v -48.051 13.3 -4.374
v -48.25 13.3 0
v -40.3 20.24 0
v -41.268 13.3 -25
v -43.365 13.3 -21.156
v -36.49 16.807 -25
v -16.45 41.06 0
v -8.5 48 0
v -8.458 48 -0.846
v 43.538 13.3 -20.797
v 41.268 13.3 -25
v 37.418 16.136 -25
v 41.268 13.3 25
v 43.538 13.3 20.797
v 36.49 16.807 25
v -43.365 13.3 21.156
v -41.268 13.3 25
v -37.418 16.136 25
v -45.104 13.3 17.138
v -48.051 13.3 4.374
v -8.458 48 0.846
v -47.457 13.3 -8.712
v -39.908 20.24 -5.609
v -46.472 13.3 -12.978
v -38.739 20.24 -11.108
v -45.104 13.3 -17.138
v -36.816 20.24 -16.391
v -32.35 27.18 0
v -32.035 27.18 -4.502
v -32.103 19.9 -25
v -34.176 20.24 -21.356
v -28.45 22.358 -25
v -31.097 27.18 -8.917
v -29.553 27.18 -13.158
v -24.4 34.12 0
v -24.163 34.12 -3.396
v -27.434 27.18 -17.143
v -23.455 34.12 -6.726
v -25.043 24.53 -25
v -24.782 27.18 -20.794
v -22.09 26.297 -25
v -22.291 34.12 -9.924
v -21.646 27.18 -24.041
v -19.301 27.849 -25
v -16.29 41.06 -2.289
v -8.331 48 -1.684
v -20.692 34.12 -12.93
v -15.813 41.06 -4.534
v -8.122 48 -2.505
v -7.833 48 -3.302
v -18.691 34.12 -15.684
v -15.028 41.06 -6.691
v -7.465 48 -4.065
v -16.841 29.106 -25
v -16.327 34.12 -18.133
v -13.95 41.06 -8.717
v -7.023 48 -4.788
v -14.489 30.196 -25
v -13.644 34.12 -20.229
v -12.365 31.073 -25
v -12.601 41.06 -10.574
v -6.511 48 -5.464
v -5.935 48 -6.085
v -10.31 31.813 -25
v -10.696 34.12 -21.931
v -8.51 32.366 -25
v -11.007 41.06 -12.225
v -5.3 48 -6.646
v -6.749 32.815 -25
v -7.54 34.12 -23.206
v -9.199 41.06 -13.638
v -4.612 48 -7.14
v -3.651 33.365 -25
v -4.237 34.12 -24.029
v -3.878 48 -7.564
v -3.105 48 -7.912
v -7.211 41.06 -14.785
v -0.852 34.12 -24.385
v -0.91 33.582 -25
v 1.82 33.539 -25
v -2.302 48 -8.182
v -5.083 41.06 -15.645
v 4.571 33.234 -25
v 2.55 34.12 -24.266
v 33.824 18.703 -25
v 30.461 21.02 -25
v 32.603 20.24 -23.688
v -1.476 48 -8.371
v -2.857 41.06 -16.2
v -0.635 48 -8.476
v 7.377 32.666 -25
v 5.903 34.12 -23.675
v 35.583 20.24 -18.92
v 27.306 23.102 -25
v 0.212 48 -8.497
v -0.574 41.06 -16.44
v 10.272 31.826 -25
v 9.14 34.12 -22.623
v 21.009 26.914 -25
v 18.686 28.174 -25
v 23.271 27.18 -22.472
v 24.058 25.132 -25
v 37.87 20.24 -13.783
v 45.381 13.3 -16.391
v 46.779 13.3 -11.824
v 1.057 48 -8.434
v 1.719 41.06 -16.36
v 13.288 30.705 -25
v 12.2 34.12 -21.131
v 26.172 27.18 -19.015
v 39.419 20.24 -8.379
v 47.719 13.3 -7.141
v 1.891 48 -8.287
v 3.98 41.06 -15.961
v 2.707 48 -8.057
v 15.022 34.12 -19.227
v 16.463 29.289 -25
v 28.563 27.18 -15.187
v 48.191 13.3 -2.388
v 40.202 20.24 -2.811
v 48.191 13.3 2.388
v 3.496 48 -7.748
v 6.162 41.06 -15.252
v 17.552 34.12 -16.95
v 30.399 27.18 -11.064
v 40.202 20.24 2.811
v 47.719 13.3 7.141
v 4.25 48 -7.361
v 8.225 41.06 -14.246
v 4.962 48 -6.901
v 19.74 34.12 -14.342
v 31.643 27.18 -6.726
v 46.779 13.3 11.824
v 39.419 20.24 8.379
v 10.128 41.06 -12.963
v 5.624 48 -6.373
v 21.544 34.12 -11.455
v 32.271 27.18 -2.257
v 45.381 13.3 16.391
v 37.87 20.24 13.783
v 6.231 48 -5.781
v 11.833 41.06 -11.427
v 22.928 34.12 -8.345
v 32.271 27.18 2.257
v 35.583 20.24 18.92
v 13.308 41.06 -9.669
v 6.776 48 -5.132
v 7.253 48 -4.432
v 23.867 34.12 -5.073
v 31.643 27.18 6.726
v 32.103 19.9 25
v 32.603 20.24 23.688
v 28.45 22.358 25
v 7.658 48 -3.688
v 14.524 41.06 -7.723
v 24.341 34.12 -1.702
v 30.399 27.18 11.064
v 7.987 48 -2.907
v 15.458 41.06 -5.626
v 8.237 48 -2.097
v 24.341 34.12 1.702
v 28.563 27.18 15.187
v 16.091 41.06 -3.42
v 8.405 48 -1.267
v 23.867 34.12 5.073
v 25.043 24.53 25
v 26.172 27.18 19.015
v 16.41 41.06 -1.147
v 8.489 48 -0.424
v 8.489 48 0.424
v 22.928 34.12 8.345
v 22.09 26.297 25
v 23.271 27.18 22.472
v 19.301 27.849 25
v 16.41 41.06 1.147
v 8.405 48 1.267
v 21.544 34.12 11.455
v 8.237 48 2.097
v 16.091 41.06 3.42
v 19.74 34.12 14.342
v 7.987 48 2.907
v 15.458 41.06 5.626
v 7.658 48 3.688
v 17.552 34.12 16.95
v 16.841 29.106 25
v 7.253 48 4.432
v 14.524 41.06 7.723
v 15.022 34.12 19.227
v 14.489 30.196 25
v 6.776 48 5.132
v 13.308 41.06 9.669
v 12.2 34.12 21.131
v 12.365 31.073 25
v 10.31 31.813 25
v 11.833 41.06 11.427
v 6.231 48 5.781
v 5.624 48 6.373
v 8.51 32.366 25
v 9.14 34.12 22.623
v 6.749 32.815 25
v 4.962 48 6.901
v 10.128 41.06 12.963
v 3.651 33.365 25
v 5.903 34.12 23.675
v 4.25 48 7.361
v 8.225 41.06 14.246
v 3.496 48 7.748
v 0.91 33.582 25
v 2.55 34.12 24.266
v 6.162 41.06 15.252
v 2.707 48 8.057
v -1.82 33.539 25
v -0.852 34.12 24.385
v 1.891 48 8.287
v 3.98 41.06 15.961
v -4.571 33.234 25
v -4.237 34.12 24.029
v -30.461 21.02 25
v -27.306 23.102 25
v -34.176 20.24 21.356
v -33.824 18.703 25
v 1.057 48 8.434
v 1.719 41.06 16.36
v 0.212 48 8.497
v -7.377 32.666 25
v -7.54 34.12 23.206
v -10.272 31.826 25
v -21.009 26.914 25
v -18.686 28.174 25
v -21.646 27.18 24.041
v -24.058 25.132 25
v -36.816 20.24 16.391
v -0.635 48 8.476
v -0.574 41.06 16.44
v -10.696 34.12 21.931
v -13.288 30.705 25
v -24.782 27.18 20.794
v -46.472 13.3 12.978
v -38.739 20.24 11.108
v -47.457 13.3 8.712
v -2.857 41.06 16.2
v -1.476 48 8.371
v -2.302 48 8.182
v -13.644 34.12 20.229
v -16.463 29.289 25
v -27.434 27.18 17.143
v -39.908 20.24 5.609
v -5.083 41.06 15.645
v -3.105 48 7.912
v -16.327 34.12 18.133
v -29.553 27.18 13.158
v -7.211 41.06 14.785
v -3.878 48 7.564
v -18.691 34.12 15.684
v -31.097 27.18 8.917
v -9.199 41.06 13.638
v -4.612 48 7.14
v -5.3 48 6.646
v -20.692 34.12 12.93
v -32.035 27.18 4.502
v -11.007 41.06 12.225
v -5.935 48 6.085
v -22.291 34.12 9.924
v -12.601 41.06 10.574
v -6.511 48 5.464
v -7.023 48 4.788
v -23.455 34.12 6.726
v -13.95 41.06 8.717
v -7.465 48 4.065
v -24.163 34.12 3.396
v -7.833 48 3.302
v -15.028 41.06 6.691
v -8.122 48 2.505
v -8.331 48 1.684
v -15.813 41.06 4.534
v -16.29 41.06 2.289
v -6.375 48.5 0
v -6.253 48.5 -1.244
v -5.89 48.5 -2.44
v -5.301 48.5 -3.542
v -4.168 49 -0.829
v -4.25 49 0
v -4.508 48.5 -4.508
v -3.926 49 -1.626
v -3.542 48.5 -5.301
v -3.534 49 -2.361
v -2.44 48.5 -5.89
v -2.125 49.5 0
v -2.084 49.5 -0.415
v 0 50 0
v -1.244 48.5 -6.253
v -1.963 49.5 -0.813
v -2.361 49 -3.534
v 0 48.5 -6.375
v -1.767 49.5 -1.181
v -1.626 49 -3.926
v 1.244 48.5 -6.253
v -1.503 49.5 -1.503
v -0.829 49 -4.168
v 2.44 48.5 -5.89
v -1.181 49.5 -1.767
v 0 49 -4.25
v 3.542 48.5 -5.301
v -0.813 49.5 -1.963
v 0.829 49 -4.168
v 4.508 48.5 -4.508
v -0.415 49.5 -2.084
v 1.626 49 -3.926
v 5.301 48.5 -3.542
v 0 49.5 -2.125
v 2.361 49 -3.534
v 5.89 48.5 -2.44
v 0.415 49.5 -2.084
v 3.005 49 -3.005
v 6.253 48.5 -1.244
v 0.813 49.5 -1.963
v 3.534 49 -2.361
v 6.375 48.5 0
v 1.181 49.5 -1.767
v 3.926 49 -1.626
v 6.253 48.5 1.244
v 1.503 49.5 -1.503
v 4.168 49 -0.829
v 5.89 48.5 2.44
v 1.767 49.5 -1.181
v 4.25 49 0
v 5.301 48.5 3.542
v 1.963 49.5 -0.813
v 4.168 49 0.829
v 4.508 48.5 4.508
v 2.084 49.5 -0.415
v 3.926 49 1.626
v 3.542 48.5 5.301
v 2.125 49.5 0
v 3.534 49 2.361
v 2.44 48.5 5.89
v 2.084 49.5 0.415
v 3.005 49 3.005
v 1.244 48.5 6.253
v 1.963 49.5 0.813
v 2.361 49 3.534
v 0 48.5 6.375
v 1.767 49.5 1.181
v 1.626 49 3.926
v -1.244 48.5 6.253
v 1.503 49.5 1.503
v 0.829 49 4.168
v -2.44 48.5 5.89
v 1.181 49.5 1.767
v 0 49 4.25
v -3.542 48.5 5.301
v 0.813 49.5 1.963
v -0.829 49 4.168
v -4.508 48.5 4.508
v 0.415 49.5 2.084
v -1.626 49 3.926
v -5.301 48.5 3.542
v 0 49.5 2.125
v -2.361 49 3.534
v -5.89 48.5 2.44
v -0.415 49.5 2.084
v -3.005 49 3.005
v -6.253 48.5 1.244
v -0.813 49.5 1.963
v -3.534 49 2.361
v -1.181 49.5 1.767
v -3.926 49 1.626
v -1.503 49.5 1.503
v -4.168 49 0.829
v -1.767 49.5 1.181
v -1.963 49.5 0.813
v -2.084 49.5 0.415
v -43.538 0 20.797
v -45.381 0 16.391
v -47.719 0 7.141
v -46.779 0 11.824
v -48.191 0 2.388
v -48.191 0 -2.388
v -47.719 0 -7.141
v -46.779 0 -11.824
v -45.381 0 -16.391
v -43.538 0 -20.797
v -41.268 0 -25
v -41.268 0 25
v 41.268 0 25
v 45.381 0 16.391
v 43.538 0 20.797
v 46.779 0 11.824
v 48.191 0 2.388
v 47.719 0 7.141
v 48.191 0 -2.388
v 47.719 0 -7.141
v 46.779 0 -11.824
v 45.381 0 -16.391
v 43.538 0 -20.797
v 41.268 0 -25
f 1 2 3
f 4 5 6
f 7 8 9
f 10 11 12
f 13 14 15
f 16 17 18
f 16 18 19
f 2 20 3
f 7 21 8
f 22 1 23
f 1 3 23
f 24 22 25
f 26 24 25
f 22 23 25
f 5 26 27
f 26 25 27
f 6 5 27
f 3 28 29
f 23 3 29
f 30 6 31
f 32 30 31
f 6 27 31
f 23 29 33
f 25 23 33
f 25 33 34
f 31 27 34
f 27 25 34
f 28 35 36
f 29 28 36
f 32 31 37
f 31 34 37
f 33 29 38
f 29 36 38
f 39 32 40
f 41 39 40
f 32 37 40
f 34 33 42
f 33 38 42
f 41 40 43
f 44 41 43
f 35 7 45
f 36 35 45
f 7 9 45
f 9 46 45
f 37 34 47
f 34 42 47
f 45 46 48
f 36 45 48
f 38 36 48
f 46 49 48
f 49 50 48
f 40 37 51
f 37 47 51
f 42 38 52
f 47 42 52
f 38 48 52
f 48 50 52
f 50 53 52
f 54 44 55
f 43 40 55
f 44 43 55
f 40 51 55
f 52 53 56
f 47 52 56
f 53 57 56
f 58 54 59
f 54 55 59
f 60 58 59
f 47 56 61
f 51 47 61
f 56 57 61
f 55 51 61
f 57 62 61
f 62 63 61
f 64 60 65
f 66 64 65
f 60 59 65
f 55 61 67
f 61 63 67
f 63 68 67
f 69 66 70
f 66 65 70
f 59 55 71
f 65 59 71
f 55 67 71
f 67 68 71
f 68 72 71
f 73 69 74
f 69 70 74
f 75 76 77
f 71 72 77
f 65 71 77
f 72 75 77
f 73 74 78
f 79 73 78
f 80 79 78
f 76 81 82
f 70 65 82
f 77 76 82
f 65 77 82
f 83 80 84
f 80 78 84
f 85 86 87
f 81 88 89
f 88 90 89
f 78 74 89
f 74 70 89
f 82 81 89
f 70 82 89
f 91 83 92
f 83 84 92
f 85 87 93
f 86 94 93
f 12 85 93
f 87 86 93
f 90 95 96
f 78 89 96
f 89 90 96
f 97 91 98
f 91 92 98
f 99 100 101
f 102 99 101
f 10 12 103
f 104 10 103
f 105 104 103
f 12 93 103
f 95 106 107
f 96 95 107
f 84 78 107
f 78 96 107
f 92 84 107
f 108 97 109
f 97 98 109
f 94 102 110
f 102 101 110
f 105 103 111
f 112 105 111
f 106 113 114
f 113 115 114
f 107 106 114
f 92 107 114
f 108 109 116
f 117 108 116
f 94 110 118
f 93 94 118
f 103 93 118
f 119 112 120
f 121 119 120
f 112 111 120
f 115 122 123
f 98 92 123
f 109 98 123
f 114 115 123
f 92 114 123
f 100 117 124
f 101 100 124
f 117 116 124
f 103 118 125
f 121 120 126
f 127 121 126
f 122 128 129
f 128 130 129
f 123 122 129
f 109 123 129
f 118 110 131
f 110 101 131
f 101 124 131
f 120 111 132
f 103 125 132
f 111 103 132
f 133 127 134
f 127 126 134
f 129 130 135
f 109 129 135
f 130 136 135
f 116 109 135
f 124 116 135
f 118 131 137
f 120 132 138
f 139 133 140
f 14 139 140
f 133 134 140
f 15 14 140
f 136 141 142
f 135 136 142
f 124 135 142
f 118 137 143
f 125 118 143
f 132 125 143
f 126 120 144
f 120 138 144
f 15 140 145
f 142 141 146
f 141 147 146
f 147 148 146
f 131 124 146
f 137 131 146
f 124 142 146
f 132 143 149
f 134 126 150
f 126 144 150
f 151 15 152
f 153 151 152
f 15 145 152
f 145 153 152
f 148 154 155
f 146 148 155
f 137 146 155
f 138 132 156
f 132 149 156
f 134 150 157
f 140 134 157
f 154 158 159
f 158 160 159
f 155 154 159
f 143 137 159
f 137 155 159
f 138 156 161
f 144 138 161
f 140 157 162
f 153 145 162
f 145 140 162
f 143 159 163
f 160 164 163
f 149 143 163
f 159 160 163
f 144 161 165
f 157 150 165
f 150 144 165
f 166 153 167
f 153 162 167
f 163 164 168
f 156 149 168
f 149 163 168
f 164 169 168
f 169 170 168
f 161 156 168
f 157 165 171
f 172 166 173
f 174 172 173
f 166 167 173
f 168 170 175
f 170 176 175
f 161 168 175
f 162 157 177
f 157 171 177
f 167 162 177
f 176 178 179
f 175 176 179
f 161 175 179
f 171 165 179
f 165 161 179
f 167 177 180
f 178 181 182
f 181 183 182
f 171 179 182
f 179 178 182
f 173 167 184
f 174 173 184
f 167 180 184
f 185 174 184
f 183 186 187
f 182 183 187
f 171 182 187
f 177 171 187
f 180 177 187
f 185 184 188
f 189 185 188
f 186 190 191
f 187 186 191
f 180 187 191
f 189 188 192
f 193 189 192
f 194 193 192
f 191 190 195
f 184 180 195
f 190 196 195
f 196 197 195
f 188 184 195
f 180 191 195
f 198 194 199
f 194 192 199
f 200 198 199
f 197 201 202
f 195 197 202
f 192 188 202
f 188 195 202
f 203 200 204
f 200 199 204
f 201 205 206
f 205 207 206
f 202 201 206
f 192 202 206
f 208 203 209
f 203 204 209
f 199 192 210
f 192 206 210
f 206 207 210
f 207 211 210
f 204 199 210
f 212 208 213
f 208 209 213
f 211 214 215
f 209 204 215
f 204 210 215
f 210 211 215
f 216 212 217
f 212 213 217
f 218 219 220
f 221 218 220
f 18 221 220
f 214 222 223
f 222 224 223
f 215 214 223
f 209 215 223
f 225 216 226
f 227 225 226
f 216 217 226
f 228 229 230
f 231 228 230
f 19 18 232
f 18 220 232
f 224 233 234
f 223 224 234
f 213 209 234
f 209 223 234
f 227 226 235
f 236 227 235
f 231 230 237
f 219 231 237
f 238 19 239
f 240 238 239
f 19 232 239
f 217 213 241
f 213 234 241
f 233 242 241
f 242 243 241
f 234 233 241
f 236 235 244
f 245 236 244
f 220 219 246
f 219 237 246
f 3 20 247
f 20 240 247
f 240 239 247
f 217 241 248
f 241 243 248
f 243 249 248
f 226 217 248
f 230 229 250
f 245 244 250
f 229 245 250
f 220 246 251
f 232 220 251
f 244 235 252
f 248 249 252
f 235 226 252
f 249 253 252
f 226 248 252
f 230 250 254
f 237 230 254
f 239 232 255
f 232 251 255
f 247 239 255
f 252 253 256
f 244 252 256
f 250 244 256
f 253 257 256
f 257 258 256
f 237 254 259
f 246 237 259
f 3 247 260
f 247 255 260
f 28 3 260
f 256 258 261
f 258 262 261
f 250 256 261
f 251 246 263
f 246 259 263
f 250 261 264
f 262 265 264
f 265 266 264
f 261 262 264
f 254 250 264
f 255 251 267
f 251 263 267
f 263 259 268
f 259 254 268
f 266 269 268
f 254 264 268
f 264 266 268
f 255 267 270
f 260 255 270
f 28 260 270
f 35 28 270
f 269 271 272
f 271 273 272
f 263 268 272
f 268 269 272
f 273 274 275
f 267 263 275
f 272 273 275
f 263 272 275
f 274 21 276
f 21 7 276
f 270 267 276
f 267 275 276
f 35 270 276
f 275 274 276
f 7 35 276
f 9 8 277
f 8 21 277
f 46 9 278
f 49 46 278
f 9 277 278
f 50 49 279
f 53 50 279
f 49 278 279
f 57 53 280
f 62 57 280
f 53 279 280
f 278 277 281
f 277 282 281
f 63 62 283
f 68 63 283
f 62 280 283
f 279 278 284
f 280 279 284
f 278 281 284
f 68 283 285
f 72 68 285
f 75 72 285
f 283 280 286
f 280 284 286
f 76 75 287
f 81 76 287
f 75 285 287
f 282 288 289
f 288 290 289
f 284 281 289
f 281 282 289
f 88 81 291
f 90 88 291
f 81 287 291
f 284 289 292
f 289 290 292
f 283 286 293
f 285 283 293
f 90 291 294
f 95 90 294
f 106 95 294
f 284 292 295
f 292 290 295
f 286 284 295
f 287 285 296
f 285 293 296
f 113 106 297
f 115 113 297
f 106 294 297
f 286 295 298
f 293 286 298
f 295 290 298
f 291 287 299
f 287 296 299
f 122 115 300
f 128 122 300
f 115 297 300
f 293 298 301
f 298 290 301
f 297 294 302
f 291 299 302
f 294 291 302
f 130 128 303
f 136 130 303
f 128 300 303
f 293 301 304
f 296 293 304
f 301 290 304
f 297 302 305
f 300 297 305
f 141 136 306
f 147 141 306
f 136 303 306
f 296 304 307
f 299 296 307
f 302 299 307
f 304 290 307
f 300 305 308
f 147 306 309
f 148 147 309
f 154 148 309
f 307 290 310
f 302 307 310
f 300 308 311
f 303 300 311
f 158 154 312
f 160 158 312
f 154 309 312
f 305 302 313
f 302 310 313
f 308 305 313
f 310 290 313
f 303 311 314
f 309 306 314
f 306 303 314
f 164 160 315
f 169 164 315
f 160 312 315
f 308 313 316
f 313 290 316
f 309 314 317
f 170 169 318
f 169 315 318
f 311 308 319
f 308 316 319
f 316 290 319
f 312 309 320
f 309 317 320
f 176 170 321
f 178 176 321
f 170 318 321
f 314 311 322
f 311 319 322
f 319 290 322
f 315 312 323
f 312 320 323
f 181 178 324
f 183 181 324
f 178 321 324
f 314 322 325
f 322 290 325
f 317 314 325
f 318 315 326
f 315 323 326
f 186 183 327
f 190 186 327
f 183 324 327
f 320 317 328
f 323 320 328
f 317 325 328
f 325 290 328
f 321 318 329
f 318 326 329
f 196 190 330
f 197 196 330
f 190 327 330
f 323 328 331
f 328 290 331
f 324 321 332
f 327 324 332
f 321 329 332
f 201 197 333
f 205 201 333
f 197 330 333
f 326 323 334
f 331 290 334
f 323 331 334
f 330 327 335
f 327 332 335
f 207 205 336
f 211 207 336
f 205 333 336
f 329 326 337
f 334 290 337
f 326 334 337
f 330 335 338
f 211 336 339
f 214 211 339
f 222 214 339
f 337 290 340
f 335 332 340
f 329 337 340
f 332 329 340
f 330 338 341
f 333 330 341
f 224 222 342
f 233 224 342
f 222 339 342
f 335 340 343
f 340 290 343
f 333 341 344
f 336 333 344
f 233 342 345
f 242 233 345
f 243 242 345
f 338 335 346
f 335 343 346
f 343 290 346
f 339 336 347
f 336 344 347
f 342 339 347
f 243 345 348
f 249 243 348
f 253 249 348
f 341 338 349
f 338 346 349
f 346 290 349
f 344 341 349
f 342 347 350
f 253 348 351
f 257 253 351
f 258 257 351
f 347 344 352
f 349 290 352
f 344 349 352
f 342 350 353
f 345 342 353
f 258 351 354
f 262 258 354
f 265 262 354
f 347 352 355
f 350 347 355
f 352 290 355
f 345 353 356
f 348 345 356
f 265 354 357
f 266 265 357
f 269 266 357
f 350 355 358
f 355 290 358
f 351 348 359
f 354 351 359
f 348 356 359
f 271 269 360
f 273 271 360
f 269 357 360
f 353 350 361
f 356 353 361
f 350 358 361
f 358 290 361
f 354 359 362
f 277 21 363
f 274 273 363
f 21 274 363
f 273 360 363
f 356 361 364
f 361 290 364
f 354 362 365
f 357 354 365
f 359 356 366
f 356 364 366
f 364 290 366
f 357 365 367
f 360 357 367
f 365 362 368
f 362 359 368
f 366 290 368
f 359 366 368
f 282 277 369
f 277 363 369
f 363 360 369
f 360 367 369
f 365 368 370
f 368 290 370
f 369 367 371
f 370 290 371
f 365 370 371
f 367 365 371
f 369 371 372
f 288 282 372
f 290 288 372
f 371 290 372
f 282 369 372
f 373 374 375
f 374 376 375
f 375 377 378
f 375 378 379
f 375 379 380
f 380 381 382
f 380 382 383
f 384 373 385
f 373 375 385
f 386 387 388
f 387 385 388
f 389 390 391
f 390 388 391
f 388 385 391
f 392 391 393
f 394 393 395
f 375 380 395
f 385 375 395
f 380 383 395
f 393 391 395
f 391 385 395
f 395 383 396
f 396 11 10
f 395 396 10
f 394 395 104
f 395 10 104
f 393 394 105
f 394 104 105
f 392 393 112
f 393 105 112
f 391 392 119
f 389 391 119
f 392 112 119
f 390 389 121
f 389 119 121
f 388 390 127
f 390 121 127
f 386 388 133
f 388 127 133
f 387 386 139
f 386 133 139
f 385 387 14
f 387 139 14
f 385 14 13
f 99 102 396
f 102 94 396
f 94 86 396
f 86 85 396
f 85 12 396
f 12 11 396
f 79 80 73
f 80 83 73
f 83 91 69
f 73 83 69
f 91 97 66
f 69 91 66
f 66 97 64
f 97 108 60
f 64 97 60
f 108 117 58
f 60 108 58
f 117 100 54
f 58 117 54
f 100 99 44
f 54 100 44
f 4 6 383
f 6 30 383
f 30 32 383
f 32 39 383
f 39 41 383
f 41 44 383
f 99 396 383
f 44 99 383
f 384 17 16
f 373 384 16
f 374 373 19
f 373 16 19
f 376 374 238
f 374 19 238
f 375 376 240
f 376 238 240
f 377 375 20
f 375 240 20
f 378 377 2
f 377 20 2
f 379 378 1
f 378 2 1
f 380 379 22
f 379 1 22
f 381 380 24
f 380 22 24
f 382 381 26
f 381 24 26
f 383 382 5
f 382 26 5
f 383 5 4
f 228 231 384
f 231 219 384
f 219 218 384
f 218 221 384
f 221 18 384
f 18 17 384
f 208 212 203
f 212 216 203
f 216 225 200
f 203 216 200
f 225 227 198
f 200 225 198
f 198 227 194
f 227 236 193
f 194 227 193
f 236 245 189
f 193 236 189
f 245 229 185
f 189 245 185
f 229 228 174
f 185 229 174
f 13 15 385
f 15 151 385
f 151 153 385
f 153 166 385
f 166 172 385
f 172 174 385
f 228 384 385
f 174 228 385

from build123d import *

# Parameters (mm, degrees)
CORTAR_EXTRUIR1_DEPTH = 51


with BuildPart() as part:
    # Croquis1 → Revolución1 (revolve)
    with BuildSketch(Plane.XY):
        Polygon((0, 0), (-48.25, 0), (-48.25, 13.3), (-8.5, 48), (0, 50), align=None)
    revolve(axis=Axis((0, 53.503350084, 0), (0, -1, 0)))

    # Croquis2 → Cortar-Extruir1 (cut, through all)
    with BuildSketch(Plane.XZ):
        with BuildLine():
            ThreePointArc((41.268177813, 25), (0, 48.25), (-41.268177813, 25))
            Line((-41.268177813, 25), (41.268177813, 25))
        make_face()
        with BuildLine():
            Line((41.268177813, -25), (-41.268177813, -25))
            ThreePointArc((-41.268177813, -25), (0, -48.25), (41.268177813, -25))
        make_face()
    extrude(amount=-CORTAR_EXTRUIR1_DEPTH, mode=Mode.SUBTRACT)


solid = part.part
